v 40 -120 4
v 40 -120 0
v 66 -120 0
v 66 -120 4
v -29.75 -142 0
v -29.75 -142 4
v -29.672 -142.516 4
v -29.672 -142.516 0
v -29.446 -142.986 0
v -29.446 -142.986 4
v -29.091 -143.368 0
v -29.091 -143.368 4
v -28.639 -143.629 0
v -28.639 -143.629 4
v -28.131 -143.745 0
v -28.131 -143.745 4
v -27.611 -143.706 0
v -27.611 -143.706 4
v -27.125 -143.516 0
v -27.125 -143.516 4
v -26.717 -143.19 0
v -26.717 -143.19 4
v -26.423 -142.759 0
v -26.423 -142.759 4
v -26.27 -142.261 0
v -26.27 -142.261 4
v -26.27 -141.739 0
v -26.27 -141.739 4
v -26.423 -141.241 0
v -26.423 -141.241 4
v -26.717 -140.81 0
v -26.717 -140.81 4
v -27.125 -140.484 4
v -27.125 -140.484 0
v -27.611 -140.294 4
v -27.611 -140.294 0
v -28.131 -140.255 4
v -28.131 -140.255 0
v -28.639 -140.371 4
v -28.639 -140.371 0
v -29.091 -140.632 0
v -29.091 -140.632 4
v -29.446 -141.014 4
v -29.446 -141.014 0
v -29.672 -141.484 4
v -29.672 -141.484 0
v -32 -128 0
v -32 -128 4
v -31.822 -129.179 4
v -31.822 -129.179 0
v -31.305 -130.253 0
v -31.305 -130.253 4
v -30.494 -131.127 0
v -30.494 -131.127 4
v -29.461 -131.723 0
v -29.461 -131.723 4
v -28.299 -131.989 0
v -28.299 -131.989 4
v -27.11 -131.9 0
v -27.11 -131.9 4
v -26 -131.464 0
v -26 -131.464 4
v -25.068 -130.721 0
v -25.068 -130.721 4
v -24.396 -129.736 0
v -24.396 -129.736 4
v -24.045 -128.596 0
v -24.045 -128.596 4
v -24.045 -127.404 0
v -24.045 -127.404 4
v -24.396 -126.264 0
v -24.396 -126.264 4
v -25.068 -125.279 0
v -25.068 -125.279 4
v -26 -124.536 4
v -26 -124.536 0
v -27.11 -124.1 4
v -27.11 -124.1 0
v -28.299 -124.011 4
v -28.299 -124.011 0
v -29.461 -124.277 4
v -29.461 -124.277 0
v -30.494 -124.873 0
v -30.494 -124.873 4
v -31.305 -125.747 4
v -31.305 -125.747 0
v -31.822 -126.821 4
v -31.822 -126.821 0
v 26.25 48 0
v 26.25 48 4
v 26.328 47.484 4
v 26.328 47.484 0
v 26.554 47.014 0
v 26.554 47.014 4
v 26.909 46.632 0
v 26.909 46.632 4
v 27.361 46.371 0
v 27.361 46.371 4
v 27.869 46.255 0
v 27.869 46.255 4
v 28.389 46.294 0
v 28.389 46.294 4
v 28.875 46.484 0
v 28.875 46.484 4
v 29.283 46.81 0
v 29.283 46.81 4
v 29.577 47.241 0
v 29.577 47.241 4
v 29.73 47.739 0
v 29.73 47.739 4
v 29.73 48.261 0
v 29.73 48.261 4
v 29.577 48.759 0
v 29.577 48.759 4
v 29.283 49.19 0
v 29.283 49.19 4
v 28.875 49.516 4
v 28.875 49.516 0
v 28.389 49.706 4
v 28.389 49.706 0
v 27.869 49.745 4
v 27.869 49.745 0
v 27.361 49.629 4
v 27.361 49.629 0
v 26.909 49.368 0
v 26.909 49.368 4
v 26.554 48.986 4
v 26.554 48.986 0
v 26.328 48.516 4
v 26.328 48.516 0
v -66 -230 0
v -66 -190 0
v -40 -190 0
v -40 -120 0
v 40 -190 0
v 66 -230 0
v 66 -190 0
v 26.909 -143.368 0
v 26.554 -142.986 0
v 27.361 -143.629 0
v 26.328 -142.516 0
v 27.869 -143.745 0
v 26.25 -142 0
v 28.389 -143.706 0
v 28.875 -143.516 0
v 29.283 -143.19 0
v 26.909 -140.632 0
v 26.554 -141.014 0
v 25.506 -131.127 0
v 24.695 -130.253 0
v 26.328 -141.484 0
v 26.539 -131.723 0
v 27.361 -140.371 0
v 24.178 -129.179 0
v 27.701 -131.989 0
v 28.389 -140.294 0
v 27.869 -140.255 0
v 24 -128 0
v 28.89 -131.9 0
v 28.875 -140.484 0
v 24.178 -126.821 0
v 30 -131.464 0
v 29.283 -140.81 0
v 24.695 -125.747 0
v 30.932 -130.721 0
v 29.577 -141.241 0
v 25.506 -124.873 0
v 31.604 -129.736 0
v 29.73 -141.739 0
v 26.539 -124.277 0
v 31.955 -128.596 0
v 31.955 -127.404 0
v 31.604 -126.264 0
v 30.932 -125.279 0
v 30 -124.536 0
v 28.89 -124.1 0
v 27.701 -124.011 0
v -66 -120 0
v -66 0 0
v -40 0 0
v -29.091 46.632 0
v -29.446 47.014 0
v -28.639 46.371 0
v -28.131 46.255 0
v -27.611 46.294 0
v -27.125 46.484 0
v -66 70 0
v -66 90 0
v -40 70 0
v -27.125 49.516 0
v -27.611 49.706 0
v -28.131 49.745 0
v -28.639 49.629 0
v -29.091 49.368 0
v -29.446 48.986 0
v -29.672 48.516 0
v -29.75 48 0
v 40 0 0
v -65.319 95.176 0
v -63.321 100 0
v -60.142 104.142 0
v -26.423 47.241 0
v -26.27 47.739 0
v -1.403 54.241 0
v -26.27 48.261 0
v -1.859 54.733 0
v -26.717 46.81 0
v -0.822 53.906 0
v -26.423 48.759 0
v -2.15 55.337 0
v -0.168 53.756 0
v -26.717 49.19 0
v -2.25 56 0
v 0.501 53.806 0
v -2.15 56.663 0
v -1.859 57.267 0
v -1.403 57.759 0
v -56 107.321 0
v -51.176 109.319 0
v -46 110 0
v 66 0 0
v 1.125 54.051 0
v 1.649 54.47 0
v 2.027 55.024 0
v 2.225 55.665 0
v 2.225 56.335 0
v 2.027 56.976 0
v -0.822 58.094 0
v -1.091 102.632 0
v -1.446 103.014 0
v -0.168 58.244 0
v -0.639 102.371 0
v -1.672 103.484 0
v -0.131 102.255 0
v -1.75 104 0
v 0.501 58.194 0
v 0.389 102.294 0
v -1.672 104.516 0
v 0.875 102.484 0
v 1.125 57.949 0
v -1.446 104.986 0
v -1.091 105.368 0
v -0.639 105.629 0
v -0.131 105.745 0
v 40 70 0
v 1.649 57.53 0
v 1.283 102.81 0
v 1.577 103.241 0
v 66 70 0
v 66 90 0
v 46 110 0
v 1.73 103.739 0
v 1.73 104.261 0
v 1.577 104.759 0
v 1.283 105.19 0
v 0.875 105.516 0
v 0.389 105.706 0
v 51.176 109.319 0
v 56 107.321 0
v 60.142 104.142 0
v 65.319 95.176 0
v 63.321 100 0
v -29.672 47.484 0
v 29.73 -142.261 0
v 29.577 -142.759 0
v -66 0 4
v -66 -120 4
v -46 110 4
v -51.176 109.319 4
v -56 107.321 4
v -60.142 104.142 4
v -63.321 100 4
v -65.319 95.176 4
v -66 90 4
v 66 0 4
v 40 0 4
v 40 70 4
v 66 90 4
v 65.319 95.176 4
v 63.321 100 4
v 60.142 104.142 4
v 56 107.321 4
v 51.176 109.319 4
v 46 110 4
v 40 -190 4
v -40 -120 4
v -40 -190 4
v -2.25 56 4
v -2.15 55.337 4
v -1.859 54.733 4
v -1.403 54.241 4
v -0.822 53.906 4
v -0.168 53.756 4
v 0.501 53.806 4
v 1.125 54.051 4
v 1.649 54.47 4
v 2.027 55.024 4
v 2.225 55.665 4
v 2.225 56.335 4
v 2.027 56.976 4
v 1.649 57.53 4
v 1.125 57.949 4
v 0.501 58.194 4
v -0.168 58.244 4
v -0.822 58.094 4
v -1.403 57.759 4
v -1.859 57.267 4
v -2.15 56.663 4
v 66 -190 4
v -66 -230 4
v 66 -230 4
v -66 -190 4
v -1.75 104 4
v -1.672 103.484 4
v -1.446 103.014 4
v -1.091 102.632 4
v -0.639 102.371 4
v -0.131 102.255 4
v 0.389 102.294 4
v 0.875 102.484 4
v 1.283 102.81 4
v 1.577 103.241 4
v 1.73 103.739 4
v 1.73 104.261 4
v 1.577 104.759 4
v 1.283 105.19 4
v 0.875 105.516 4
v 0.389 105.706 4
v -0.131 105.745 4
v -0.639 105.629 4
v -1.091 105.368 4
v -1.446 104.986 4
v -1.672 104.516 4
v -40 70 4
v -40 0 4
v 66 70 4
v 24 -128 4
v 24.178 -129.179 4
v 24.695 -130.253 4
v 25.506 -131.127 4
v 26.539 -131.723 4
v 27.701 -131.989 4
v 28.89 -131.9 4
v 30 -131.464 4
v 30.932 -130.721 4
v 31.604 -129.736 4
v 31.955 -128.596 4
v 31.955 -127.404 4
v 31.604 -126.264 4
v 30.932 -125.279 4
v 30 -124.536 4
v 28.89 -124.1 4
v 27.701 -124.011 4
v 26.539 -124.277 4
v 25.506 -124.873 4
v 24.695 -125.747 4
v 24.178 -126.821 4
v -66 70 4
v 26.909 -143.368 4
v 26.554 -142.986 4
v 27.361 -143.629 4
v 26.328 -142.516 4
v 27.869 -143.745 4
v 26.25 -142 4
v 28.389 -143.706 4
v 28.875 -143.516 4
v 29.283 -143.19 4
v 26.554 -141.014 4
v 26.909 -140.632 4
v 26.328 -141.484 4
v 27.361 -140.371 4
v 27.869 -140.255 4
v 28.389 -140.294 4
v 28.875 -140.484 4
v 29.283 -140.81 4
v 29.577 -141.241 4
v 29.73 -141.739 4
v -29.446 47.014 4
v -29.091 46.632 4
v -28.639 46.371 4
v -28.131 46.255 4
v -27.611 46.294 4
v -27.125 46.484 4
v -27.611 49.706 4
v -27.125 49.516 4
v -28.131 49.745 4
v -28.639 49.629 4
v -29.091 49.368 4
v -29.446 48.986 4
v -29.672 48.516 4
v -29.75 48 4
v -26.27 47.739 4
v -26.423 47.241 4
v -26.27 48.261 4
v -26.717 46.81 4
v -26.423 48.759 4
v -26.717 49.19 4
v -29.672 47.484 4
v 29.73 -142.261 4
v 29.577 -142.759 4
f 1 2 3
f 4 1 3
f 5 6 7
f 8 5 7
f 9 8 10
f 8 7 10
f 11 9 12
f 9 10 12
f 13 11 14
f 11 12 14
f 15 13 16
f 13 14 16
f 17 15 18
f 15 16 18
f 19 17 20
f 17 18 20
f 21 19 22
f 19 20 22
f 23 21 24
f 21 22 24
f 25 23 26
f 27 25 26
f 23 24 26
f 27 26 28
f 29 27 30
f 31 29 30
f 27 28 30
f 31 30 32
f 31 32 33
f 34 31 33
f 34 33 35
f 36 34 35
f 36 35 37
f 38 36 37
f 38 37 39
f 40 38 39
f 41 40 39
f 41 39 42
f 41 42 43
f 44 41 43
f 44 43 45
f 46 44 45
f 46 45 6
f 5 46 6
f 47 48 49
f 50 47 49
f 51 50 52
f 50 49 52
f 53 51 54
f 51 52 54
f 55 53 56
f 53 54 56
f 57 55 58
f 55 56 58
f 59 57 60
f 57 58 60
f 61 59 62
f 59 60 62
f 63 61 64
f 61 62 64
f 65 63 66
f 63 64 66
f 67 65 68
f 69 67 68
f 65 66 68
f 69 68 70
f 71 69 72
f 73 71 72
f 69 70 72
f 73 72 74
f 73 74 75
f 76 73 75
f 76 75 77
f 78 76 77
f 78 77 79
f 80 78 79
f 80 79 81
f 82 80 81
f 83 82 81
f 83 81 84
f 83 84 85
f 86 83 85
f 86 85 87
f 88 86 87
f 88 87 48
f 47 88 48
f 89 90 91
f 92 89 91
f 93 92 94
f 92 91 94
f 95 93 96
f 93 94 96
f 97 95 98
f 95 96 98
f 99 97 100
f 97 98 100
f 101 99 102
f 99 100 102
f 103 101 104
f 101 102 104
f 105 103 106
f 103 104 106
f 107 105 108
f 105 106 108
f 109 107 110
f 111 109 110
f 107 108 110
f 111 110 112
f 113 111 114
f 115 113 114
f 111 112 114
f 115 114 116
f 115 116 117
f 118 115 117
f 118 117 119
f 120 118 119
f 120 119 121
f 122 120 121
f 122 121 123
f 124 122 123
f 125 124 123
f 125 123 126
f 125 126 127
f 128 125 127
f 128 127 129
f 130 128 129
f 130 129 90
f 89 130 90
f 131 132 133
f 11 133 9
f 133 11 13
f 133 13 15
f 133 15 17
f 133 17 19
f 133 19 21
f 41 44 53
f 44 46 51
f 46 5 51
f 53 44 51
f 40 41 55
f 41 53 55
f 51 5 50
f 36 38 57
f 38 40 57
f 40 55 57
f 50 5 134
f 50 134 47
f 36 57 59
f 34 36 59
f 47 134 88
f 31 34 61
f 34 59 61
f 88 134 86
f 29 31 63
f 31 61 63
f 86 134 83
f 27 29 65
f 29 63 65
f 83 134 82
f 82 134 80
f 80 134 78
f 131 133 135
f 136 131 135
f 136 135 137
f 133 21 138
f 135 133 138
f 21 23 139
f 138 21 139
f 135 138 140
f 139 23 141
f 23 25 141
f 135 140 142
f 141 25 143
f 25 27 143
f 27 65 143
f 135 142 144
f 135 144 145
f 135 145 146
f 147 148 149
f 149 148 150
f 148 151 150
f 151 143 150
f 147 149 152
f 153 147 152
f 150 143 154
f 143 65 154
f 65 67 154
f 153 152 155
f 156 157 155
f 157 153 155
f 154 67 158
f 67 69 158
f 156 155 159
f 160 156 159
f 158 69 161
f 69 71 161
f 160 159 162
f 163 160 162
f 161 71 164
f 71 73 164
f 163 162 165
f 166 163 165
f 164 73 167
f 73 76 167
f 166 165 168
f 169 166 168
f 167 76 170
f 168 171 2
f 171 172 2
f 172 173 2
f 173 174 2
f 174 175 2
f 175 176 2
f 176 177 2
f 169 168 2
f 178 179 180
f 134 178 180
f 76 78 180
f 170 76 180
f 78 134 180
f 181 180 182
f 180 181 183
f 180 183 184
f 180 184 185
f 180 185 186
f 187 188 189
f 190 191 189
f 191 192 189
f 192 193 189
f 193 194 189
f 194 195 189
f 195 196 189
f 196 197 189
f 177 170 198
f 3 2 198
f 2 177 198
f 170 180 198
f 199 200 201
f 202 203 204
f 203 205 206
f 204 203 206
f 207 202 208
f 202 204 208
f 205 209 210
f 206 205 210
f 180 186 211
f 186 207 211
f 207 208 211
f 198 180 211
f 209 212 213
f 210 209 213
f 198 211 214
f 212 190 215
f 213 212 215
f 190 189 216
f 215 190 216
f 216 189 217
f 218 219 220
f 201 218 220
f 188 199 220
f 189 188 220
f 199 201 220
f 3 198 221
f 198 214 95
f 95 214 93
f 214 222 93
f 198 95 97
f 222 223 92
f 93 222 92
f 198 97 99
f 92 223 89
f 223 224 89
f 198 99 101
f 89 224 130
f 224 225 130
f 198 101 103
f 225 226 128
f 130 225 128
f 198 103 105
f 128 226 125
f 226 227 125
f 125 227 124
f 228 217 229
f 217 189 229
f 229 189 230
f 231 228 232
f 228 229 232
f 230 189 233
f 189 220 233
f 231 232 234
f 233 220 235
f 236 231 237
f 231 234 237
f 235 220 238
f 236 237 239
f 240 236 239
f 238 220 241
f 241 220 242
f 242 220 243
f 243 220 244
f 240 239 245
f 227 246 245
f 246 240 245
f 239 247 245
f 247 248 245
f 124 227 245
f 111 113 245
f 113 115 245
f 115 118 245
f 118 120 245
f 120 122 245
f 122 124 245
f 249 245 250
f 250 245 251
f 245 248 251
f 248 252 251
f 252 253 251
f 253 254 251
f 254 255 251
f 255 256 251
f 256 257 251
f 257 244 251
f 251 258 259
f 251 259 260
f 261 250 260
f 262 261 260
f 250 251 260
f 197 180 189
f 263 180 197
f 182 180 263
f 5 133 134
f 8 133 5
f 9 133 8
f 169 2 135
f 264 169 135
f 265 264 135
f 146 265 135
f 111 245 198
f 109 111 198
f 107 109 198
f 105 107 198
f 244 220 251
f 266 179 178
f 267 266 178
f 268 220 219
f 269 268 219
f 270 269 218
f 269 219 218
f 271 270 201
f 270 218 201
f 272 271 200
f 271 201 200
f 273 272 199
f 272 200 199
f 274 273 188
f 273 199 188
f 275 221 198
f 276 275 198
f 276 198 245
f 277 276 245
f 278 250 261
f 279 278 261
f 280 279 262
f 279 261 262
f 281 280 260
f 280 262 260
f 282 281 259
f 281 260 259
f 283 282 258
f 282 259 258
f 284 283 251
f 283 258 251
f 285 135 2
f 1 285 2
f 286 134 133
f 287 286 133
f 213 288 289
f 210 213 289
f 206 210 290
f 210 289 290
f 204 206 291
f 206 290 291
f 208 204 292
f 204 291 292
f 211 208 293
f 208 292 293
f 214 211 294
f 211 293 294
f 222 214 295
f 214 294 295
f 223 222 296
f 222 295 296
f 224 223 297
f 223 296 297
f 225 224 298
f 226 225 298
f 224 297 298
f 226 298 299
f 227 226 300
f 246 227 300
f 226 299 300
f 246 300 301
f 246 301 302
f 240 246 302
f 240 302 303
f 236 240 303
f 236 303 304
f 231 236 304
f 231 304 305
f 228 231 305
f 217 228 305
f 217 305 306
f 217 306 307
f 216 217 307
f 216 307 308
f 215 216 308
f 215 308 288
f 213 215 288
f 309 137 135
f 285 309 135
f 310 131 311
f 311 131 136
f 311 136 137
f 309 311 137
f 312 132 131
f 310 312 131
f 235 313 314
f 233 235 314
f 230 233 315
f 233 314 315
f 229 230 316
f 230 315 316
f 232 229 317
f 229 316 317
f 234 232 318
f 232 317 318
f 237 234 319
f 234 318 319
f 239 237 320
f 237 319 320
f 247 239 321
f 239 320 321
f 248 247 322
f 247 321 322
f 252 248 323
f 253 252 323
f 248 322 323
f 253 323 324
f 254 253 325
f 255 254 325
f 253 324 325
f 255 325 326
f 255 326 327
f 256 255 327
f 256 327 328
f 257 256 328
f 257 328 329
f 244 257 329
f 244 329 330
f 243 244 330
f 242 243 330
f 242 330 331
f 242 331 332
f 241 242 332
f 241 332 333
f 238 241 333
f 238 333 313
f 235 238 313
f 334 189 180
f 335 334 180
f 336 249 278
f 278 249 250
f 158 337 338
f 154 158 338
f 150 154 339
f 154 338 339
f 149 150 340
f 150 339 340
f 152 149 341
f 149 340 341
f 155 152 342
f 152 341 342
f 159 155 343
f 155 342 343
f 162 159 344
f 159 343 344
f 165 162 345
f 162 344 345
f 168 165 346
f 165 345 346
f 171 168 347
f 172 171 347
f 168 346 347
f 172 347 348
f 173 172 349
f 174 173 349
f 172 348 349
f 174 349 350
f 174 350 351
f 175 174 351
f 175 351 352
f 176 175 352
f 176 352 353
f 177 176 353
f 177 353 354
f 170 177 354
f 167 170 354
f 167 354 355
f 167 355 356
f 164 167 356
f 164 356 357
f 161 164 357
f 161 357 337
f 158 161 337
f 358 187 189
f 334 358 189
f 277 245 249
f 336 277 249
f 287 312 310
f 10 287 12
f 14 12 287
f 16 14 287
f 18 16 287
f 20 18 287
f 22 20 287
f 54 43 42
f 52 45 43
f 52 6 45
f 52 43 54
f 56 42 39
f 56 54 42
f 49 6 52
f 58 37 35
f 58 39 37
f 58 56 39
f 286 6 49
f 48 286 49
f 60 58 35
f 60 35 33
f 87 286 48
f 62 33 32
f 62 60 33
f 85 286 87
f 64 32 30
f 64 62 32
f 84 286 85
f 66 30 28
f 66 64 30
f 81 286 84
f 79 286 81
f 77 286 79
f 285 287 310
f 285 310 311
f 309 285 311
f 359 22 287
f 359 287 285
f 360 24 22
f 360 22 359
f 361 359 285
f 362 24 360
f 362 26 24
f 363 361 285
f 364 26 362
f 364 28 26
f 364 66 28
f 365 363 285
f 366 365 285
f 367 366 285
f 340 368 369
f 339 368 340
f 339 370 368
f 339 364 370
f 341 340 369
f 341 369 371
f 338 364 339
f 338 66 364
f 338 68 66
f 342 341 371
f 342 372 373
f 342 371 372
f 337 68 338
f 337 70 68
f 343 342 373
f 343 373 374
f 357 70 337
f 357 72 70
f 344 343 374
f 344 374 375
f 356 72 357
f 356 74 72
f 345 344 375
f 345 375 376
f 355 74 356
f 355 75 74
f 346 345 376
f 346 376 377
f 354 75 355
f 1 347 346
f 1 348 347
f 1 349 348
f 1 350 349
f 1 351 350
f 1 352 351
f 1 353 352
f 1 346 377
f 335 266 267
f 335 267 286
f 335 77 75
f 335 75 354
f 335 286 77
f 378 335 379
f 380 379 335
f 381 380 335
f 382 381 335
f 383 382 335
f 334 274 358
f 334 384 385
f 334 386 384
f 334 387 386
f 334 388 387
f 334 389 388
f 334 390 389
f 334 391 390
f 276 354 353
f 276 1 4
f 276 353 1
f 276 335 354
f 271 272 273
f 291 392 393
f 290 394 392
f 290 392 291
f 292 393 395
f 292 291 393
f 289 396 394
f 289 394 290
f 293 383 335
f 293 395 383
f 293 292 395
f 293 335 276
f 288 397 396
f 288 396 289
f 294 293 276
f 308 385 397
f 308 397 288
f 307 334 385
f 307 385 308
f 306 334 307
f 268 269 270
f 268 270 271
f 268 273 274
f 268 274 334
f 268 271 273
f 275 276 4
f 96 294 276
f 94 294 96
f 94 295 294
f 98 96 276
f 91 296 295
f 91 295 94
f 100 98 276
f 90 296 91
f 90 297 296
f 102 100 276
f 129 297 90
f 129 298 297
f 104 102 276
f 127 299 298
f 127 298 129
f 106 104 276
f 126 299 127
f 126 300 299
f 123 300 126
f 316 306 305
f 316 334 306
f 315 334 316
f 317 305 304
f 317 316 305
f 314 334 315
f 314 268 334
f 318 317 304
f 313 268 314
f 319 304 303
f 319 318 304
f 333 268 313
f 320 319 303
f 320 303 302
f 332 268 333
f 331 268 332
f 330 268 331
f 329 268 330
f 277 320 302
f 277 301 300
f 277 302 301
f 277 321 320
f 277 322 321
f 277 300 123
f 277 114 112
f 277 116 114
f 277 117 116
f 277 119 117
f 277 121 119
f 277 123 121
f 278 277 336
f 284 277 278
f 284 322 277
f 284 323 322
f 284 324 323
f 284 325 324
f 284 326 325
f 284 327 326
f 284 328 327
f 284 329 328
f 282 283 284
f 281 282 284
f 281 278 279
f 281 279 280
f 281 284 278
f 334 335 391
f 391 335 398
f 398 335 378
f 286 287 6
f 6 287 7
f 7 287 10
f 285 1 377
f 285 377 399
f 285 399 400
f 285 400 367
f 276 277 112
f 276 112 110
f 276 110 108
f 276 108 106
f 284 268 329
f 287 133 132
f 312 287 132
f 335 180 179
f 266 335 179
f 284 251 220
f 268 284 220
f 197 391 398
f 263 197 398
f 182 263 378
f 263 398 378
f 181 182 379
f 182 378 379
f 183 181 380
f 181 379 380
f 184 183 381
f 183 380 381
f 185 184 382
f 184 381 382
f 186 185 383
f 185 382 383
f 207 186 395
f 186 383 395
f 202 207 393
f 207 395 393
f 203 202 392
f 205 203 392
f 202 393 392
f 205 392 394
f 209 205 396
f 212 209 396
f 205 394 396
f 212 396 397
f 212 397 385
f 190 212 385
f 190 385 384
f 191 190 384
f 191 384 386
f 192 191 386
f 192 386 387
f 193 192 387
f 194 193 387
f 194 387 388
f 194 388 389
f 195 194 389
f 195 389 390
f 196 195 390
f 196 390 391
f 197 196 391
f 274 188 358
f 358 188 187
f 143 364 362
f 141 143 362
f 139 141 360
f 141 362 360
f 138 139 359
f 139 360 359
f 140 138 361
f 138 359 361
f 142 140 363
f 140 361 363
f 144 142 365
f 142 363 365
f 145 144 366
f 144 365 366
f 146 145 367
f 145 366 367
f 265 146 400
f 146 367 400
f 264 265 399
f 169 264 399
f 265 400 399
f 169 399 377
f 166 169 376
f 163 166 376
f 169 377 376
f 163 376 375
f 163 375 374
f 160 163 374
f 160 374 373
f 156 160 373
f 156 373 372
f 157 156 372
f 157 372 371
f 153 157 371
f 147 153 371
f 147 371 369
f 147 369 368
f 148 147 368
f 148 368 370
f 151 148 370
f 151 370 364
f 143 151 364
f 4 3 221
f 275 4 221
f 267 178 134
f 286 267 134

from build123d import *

# Parameters (mm, degrees)
F1_DEPTH = 4
F2_D     = 8
F3_D     = 3.5
F4_D     = 8
F5_D     = 3.5
F6_D     = 4.5
F7_D     = 3.5


with BuildPart() as f1:
    # F0 (on Top) → F1 (new body)
    with BuildSketch(Plane.XY):
        Polygon((-40, 90), (-66, 90), (-66, 70), (-41.2157141343, 70), (-40, 70), (-40, 62.8748962879), (-40, 56), (-40, 48), (-40, 0), (-66, 0), (-66, -120), (-40, -120), (-40, -128), (-40, -135.5958282948), (-40, -142), (-40, -190), (-66, -190), (-66, -230), (0, -230), (0, 56), (0, 62.8748962879), (0, 90), align=None)
        Polygon((66, 90), (0, 90), (0, 62.8748962879), (0, 56), (0, -230), (66, -230), (66, -190), (40, -190), (40, -142), (40, -128), (40, -120), (66, -120), (66, 0), (40, 0), (40, 48), (40, 70), (66, 70), align=None)
        with BuildLine():
            Line((0, 104), (0, 90))
            Line((0, 90), (66, 90))
            ThreePointArc((66, 90), (60.1421356237, 104.1421356237), (46, 110))
            Line((46, 110), (40, 110))
            Line((40, 110), (0, 110))
            Line((0, 110), (0, 104))
        make_face()
        Polygon((-40, 110), (-40, 90), (0, 90), (0, 104), (0, 110), (-6.6373916343, 110), align=None)
        with BuildLine():
            ThreePointArc((-46, 110), (-60.1421356237, 104.1421356237), (-66, 90))
            Line((-66, 90), (-40, 90))
            Line((-40, 90), (-40, 110))
            Line((-40, 110), (-46, 110))
        make_face()
    extrude(amount=F1_DEPTH)

    # F2 (through all)
    with Locations(Plane(origin=(0, 0, 0), x_dir=(1, 0, 0), z_dir=(0, 0, -1))):
        with Locations((-28, 128)):
            Hole(F2_D / 2)

    # F3 (through all)
    with Locations(Plane(origin=(0, 0, 0), x_dir=(1, 0, 0), z_dir=(0, 0, -1))):
        with Locations((-28, 142), (28, 142)):
            Hole(F3_D / 2)

    # F4 (through all)
    with Locations(Plane(origin=(0, 0, 0), x_dir=(1, 0, 0), z_dir=(0, 0, -1))):
        with Locations((28, 128)):
            Hole(F4_D / 2)

    # F5 (through all)
    with Locations(Plane(origin=(0, 0, 0), x_dir=(1, 0, 0), z_dir=(0, 0, -1))):
        with Locations((-28, -48), (28, -48)):
            Hole(F5_D / 2)

    # F6 (through all)
    with Locations(Plane(origin=(0, 0, 0), x_dir=(1, 0, 0), z_dir=(0, 0, -1))):
        with Locations((0, -56)):
            Hole(F6_D / 2)

    # F7 (through all)
    with Locations(Plane(origin=(0, 0, 0), x_dir=(1, 0, 0), z_dir=(0, 0, -1))):
        with Locations((0, -104)):
            Hole(F7_D / 2)


solid = f1.part
